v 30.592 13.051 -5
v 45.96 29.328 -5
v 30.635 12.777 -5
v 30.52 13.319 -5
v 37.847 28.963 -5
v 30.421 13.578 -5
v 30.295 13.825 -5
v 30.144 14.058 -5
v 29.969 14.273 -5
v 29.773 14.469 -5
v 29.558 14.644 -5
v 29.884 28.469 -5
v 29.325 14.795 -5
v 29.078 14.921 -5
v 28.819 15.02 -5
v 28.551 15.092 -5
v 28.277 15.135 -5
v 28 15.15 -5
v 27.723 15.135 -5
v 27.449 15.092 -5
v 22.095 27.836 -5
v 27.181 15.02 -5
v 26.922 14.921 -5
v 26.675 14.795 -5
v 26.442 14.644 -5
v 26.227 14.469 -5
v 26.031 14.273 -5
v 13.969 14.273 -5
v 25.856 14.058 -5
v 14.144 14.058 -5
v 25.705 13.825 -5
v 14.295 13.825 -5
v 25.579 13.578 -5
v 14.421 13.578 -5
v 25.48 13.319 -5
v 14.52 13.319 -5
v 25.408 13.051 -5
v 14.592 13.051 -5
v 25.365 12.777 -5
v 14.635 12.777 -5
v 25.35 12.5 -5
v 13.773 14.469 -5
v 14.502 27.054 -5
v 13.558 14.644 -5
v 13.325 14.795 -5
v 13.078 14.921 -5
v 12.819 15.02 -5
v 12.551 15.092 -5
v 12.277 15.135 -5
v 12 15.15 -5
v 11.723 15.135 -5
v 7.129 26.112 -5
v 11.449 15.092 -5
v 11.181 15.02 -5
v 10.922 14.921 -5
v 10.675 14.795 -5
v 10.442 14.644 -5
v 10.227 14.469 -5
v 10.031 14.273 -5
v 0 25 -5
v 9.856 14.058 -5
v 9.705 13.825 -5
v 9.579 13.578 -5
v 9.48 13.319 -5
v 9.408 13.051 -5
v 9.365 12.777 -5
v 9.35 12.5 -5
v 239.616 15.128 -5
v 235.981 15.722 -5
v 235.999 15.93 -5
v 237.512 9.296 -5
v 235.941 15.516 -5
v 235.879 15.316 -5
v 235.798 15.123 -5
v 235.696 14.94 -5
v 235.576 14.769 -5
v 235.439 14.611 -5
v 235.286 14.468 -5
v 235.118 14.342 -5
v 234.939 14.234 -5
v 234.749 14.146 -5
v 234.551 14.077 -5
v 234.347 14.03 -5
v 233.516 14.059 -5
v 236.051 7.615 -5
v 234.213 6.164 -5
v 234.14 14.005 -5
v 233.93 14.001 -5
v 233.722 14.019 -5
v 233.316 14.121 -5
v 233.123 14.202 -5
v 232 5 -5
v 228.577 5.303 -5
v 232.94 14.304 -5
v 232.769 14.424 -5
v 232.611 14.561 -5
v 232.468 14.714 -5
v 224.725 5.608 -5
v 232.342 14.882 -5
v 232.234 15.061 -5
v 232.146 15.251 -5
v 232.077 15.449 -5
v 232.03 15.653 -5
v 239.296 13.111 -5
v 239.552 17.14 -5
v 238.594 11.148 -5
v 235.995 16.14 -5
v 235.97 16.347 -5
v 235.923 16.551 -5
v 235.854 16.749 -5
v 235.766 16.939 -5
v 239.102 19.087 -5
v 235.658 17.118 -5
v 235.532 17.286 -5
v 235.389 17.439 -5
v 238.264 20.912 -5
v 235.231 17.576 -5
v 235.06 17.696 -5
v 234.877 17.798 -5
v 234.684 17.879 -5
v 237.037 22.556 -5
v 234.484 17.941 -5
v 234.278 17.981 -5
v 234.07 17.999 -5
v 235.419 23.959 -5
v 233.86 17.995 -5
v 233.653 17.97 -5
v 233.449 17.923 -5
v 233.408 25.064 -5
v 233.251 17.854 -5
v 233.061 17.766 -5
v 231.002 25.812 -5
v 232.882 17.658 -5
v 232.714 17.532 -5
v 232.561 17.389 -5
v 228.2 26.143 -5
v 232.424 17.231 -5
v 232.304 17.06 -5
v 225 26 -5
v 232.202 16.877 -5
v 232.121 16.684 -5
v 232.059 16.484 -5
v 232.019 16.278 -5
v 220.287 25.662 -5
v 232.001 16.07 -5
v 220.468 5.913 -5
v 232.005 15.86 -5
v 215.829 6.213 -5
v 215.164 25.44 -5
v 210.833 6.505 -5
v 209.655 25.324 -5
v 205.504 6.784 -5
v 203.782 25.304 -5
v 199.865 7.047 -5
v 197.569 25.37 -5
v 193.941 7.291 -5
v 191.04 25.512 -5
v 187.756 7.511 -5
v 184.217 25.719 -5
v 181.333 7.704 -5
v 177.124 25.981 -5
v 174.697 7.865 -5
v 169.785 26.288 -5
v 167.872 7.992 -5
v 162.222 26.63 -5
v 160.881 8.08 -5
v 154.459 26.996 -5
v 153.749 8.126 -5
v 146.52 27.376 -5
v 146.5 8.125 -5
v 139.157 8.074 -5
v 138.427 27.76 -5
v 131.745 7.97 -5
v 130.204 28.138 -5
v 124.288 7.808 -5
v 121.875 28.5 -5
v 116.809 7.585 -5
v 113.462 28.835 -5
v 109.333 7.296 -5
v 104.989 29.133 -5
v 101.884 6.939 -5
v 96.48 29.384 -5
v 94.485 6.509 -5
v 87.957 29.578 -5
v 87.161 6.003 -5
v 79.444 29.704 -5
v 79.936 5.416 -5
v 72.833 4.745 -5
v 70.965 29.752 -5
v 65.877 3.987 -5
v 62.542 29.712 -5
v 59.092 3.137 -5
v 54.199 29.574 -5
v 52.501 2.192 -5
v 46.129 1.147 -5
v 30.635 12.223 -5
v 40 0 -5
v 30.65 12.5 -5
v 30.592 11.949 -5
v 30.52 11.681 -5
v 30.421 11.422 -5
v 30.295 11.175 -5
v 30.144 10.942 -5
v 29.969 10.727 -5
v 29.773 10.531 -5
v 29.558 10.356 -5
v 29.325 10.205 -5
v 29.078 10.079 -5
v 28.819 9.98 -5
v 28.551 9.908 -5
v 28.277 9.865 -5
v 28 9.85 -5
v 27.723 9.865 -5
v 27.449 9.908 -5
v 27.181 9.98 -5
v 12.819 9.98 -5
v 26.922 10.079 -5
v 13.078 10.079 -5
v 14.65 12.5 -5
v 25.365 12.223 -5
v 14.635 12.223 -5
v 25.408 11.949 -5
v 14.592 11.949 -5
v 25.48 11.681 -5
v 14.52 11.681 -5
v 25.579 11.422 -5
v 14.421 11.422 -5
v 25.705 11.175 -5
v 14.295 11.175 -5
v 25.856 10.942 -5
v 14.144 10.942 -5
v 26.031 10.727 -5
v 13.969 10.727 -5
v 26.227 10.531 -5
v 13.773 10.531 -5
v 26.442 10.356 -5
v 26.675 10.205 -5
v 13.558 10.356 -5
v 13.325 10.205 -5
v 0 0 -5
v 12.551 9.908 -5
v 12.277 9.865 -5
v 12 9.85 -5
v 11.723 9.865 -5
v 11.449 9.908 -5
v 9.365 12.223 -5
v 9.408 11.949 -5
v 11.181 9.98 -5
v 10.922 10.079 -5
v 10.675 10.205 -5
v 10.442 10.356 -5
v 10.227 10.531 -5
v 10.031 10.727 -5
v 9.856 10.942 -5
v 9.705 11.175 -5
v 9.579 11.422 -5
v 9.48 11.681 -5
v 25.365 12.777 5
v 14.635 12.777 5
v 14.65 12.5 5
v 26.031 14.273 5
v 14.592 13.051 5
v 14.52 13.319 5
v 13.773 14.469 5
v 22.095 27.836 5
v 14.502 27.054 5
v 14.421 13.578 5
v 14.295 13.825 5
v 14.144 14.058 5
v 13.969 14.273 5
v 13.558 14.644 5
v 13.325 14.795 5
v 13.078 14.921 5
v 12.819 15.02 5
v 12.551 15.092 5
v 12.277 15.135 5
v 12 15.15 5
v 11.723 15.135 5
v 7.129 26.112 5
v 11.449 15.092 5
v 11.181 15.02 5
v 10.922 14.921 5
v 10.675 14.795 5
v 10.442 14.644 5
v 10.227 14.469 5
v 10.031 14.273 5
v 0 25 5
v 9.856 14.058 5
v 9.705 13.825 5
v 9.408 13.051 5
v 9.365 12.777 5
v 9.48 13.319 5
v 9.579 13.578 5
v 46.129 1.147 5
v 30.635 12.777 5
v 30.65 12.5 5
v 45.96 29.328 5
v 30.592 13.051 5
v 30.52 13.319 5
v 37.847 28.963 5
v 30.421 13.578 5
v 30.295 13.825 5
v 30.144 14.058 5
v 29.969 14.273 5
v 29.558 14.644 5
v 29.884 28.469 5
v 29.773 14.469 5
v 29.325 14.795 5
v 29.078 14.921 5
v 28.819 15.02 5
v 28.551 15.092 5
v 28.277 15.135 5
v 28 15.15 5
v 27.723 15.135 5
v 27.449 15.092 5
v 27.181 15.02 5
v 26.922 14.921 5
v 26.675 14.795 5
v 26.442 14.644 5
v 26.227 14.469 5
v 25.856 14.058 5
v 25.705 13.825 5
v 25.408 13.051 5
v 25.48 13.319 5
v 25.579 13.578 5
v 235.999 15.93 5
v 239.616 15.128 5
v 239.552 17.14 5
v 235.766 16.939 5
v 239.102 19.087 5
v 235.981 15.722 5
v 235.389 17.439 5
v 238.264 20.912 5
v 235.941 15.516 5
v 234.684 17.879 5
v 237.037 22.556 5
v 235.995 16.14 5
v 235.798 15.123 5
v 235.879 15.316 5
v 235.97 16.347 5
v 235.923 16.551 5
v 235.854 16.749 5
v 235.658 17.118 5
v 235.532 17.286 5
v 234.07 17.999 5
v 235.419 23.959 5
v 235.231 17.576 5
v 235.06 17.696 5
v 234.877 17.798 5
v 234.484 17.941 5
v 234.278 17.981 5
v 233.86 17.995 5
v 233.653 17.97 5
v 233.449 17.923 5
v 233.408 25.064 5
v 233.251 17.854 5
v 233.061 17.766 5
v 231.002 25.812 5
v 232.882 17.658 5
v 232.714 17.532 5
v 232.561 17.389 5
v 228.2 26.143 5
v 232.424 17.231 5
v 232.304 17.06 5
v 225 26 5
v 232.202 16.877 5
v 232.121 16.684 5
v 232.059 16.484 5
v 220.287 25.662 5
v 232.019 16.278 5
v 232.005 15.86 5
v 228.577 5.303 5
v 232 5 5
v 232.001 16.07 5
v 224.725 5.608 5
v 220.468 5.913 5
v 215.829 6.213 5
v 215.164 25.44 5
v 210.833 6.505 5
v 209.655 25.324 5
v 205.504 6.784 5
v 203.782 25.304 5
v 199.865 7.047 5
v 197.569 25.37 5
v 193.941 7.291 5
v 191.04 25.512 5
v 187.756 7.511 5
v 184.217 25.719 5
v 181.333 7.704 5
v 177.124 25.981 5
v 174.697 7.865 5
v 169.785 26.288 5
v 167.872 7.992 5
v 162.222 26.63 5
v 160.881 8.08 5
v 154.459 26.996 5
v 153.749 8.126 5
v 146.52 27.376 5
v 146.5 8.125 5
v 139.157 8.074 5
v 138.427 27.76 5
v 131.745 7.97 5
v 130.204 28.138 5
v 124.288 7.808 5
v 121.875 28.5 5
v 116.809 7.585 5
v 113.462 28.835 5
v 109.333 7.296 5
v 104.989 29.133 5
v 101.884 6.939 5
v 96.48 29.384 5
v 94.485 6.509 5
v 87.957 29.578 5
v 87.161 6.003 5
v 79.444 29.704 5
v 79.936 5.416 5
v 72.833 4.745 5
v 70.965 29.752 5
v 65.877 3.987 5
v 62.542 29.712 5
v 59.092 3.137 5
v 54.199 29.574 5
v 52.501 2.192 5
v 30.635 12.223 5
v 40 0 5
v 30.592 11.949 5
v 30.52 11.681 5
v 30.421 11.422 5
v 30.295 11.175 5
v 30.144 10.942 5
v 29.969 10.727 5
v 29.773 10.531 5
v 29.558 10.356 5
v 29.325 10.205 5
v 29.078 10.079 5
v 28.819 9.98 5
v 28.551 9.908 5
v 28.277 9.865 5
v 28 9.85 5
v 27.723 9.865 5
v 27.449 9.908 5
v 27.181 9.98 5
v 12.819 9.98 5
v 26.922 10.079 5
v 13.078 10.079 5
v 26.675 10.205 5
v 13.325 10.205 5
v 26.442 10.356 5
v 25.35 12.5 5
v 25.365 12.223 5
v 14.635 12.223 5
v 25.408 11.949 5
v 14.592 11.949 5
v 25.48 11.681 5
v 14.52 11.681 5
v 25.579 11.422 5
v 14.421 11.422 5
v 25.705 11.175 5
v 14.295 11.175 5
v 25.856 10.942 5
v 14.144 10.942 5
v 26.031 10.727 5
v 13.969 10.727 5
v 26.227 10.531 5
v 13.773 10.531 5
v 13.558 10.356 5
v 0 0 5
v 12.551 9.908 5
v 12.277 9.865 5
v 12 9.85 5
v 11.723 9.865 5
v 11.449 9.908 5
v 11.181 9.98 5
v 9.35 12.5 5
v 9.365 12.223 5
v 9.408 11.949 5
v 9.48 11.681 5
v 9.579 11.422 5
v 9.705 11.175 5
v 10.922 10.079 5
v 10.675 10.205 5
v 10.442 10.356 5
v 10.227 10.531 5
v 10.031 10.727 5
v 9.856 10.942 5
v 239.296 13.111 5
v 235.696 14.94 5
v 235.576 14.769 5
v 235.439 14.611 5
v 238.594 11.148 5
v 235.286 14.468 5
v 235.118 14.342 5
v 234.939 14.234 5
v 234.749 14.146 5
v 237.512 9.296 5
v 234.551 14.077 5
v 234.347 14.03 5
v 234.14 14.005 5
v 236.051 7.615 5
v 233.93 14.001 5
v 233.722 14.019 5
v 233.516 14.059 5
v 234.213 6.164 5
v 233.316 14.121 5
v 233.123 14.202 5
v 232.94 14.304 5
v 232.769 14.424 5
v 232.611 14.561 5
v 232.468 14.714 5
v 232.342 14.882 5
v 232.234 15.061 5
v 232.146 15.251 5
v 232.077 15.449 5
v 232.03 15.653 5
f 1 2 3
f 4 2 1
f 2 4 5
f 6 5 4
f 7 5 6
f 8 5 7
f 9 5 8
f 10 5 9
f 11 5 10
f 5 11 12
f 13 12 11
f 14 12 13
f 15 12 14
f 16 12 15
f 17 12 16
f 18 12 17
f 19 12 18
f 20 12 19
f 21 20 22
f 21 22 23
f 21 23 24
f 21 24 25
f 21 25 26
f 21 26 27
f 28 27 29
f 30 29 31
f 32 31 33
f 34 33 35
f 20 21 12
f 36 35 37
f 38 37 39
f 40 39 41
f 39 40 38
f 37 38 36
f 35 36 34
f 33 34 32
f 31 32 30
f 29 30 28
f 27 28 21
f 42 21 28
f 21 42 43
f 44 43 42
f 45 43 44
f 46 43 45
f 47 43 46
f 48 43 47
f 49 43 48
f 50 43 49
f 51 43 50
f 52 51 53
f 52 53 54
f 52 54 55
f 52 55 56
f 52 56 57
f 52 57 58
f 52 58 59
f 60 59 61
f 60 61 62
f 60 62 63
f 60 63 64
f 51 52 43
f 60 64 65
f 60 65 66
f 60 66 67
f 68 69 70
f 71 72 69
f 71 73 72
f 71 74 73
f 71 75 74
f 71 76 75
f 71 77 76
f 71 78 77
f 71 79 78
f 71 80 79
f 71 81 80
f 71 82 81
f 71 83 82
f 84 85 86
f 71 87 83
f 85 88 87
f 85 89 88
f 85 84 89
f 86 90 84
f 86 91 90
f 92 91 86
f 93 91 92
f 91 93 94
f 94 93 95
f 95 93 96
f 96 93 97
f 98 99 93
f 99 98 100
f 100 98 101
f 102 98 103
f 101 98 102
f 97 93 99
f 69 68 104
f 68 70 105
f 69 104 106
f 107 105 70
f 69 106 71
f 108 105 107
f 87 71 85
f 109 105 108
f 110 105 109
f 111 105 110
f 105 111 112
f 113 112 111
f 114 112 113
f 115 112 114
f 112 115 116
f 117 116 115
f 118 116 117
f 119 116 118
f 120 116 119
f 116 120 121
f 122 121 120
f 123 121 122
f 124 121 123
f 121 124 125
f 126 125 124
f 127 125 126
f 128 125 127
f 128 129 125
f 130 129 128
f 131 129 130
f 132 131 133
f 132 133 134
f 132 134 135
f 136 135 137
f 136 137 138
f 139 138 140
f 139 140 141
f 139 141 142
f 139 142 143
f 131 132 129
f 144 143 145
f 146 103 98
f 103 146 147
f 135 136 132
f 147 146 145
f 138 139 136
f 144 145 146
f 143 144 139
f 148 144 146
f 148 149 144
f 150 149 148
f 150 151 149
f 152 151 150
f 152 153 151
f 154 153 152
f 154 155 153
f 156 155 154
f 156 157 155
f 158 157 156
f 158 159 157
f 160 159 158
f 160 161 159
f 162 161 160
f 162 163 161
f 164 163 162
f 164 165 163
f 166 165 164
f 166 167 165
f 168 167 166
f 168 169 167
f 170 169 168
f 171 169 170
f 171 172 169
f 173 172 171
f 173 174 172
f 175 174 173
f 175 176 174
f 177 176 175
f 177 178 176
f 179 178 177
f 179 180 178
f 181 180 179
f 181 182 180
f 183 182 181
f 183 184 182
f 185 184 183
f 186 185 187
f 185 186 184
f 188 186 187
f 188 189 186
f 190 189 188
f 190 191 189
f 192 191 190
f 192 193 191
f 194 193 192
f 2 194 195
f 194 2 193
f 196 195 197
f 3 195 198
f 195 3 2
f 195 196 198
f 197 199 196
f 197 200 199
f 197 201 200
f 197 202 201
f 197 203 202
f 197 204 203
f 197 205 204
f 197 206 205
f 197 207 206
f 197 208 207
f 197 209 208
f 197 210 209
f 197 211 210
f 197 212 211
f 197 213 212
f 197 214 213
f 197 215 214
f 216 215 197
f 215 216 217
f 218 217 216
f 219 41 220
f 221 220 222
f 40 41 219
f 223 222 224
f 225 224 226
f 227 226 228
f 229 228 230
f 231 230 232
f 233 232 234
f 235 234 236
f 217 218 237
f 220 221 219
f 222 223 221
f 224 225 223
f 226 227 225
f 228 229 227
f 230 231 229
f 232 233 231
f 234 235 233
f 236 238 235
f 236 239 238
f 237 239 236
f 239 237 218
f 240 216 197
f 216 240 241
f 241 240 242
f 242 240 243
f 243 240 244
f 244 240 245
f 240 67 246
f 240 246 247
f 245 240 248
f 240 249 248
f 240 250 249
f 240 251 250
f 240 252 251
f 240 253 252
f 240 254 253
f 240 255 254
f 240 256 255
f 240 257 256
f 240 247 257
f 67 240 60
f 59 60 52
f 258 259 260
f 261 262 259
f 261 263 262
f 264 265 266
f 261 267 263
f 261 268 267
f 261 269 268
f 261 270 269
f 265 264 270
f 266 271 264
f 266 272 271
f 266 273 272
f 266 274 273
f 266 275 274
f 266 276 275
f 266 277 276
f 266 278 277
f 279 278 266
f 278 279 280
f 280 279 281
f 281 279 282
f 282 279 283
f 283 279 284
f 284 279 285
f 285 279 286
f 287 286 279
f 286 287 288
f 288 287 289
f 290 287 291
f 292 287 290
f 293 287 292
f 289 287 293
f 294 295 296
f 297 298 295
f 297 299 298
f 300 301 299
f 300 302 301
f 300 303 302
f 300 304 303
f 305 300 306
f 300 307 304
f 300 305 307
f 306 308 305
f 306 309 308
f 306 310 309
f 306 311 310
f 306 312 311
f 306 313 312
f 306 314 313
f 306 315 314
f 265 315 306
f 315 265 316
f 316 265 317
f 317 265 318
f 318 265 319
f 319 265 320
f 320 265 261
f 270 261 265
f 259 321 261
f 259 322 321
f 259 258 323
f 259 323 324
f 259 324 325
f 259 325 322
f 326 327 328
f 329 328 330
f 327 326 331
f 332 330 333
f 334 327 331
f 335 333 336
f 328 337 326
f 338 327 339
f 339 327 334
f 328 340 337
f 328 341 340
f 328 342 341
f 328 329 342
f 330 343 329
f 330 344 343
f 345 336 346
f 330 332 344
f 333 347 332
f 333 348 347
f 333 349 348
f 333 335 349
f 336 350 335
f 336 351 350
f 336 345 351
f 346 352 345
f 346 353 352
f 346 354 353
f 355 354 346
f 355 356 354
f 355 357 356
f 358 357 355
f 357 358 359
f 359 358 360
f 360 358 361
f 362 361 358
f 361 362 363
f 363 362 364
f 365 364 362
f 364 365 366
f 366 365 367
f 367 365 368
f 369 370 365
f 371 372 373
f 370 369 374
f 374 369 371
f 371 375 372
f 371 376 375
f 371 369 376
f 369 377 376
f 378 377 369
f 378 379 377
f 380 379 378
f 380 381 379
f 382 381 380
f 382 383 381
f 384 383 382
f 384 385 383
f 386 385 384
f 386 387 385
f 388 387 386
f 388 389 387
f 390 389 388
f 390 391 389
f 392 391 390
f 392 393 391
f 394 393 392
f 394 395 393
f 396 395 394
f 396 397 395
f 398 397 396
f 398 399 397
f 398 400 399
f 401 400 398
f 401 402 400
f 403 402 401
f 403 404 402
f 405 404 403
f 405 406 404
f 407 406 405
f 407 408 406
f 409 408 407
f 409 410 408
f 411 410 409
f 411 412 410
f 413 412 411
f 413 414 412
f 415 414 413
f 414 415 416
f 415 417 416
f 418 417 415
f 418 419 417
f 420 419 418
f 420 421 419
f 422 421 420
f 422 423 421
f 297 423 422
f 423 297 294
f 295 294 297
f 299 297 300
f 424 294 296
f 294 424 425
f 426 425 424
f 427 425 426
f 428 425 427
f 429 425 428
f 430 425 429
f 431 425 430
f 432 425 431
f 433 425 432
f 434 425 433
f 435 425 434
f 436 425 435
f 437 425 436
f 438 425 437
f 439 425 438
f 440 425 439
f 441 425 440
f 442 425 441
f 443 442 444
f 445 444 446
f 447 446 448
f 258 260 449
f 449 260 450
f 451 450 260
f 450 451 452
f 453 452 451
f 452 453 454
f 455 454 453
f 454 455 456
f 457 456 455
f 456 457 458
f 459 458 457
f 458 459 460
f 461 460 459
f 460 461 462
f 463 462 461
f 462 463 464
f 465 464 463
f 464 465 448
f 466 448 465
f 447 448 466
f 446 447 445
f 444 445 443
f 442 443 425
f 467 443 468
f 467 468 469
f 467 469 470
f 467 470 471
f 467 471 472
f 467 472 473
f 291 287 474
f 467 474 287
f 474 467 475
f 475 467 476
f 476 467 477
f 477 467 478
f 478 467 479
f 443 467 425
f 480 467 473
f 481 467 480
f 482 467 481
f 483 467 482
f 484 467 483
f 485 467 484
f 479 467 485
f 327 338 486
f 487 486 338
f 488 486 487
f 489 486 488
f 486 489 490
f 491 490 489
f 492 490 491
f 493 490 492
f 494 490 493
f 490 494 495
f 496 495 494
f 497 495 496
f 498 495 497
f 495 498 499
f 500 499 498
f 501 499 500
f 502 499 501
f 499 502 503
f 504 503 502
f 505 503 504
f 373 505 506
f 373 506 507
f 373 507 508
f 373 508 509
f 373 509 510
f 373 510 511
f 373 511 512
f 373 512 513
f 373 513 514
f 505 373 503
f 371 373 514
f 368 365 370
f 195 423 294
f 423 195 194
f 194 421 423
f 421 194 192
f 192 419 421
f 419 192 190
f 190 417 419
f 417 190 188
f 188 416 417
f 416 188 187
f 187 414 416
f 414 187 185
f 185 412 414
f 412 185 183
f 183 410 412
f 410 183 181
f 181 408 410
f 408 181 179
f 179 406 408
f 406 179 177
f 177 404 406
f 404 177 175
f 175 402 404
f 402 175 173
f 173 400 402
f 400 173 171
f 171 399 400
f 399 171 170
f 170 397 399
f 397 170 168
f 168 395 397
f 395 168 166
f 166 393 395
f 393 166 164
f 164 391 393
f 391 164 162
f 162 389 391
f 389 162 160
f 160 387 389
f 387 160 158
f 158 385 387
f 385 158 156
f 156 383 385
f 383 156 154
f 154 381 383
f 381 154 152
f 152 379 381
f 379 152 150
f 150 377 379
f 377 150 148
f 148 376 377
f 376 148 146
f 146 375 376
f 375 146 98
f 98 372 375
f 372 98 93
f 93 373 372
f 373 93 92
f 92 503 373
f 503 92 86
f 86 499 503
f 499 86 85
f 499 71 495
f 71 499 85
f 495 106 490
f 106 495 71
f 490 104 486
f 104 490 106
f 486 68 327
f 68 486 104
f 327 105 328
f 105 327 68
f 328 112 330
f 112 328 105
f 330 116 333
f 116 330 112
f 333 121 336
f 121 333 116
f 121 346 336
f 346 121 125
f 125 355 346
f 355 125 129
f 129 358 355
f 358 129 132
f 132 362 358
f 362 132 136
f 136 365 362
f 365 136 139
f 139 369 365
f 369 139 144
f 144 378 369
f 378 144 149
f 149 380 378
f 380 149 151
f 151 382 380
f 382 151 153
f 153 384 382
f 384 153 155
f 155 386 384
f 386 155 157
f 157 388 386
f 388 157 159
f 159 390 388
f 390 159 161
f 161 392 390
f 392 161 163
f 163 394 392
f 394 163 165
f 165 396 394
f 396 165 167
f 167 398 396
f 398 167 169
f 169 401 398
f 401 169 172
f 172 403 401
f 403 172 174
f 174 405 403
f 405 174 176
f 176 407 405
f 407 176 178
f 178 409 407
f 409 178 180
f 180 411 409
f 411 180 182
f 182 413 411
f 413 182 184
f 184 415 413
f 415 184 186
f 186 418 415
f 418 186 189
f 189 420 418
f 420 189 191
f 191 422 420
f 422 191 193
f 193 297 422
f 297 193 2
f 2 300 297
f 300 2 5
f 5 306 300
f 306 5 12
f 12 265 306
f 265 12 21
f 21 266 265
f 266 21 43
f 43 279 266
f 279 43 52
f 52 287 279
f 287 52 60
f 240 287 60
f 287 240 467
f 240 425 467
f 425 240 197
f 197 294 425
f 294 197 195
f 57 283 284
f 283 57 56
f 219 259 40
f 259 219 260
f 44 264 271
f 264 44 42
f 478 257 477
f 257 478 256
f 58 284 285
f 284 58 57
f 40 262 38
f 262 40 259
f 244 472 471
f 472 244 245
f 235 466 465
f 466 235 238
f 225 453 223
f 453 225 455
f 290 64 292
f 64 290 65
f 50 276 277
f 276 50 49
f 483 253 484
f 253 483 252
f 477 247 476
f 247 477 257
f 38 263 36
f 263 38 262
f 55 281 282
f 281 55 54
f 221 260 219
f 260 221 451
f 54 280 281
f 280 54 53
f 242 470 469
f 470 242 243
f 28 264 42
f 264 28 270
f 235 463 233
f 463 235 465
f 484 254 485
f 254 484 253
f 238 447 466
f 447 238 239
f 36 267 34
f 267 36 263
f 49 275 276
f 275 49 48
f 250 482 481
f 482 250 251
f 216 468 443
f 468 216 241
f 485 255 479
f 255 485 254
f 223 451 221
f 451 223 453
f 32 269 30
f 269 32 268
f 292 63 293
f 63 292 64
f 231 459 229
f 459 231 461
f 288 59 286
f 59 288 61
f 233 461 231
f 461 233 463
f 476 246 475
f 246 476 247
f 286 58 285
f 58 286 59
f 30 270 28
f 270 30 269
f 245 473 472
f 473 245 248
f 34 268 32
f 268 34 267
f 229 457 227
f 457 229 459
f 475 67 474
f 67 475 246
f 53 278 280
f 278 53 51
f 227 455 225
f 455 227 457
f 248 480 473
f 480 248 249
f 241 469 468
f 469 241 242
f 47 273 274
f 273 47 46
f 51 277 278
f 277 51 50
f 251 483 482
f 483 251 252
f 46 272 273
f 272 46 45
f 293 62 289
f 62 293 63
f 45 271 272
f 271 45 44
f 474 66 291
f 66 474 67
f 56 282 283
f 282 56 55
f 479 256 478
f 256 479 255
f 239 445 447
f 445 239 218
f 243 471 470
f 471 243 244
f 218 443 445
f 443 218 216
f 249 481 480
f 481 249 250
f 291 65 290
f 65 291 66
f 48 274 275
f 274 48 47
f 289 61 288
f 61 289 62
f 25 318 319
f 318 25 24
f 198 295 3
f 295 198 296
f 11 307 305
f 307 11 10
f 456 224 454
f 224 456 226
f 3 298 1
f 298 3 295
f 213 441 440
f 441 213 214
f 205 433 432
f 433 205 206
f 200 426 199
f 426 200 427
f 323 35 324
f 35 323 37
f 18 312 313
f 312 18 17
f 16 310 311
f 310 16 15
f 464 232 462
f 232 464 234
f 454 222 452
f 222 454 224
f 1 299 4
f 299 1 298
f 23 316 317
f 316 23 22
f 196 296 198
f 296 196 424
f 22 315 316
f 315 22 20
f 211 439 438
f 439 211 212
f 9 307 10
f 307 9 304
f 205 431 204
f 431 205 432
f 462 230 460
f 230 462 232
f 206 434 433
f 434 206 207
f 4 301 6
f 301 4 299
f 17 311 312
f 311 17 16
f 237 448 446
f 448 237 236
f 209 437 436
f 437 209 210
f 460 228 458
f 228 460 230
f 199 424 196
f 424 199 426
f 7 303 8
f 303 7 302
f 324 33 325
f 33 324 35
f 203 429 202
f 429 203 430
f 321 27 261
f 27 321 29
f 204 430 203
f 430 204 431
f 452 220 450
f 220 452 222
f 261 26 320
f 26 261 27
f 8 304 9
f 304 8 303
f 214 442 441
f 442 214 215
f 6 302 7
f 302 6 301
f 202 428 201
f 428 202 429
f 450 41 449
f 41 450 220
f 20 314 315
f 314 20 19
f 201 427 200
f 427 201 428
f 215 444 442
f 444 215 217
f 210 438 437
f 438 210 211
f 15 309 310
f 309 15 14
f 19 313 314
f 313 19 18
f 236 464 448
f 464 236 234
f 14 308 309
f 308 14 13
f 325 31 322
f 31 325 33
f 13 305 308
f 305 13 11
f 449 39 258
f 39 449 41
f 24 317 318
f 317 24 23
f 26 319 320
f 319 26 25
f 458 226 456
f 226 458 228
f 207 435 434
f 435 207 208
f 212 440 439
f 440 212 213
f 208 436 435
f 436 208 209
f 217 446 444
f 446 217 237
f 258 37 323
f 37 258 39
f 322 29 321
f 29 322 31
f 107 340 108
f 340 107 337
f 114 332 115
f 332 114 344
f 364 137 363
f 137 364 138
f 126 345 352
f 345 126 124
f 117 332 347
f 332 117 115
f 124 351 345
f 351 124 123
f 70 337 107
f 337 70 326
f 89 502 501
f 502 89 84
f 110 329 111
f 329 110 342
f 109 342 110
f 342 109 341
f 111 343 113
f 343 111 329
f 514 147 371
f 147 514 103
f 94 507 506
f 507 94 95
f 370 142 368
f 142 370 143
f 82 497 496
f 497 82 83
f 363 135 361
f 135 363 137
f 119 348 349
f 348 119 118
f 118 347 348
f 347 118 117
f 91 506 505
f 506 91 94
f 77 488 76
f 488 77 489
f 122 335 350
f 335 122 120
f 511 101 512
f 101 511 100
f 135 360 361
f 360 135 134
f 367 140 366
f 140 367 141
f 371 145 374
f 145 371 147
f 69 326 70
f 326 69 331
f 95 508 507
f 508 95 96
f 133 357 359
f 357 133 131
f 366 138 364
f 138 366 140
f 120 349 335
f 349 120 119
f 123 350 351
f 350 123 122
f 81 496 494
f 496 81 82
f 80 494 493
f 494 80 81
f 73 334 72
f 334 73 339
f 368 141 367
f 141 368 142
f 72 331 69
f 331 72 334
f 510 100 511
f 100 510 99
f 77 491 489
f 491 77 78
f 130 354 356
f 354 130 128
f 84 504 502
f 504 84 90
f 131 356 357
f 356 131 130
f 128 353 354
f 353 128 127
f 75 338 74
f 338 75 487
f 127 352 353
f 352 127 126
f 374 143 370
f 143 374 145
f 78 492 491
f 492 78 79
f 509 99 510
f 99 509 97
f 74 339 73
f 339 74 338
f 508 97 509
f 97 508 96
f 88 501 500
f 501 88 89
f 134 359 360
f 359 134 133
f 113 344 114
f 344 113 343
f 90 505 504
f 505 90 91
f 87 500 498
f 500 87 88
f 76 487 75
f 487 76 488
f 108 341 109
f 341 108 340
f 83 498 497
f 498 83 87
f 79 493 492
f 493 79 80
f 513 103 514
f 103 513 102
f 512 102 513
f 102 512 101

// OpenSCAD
// ========================================================
// Parametric Bow Arm / Limb Model
// Length: ~242mm (Bounding box < 250mm)
// Extrusion: Flat top/bottom faces
// ========================================================

$fn = 60; // Circle/curve resolution

// --- PARAMETERS ---
limb_thickness = 10;     // Extrusion thickness (Z-axis)
mount_width    = 25;     // Width at the central mounting block
m5_hole_dia    = 5.3;    // M5 screw clearance hole diameter (mm)

// --- BEZIER MATH HELPERS ---
// 4-point Cubic Bezier point calculation
function bezier_pt(p0, p1, p2, p3, t) =
    pow(1-t, 3)*p0 +
    3*pow(1-t, 2)*t*p1 +
    3*(1-t)*pow(t, 2)*p2 +
    pow(t, 3)*p3;

// Generate array of points along a Bezier curve
function bezier_curve(p0, p1, p2, p3, steps=25) =
    [ for (i = [0 : steps]) bezier_pt(p0, p1, p2, p3, i/steps) ];

// --- 2D BOW ARM PROFILE ---
module bow_arm_profile() {
    // Outer edge (Back of the bow arch)
    back_p0 = [0, mount_width];
    back_p1 = [70, mount_width + 12];
    back_p2 = [180, 22];
    back_p3 = [225, 26];

    // End Hook (Recurve tip)
    hook_p0 = [225, 26];
    hook_p1 = [242, 28];
    hook_p2 = [244, 10];
    hook_p3 = [232, 5];

    // Inner edge (Belly of the bow)
    belly_p0 = [232, 5];
    belly_p1 = [200, 8];
    belly_p2 = [100, 12];
    belly_p3 = [40, 0];

    // Generate curve point arrays
    c_back  = bezier_curve(back_p0, back_p1, back_p2, back_p3, 30);
    c_hook  = bezier_curve(hook_p0, hook_p1, hook_p2, hook_p3, 15);
    c_belly = bezier_curve(belly_p0, belly_p1, belly_p2, belly_p3, 30);

    // Combine into a single continuous polygon
    all_points = concat(
        [[0, 0]],
        [[0, mount_width]],
        c_back,
        c_hook,
        c_belly
    );

    polygon(points = all_points);
}

// --- 3D EXTRUDED ARM WITH M5 JOINTS ---
module bow_arm_3d() {
    difference() {
        // Flat extrusion along Z-axis
        linear_extrude(height = limb_thickness, center = true) {
            bow_arm_profile();
        }

        // M5 Screw Hole 1 (Center Joint)
        translate([12, mount_width / 2, 0])
            cylinder(d = m5_hole_dia, h = limb_thickness + 2, center = true);

        // M5 Screw Hole 2 (Center Joint)
        translate([28, mount_width / 2, 0])
            cylinder(d = m5_hole_dia, h = limb_thickness + 2, center = true);

        // String Nock Groove at the tip hook
        translate([234, 16, 0])
            rotate([0, 0, 40])
            cylinder(d = 4, h = limb_thickness + 2, center = true);
    }
}

// Render single bow arm
bow_arm_3d();

// --- PREVIEW BOTH ARMS JOINED (Uncomment to view) ---
/*
translate([0, 0, 0]) {
    bow_arm_3d();
    mirror([1, 0, 0]) bow_arm_3d();
}
*/
